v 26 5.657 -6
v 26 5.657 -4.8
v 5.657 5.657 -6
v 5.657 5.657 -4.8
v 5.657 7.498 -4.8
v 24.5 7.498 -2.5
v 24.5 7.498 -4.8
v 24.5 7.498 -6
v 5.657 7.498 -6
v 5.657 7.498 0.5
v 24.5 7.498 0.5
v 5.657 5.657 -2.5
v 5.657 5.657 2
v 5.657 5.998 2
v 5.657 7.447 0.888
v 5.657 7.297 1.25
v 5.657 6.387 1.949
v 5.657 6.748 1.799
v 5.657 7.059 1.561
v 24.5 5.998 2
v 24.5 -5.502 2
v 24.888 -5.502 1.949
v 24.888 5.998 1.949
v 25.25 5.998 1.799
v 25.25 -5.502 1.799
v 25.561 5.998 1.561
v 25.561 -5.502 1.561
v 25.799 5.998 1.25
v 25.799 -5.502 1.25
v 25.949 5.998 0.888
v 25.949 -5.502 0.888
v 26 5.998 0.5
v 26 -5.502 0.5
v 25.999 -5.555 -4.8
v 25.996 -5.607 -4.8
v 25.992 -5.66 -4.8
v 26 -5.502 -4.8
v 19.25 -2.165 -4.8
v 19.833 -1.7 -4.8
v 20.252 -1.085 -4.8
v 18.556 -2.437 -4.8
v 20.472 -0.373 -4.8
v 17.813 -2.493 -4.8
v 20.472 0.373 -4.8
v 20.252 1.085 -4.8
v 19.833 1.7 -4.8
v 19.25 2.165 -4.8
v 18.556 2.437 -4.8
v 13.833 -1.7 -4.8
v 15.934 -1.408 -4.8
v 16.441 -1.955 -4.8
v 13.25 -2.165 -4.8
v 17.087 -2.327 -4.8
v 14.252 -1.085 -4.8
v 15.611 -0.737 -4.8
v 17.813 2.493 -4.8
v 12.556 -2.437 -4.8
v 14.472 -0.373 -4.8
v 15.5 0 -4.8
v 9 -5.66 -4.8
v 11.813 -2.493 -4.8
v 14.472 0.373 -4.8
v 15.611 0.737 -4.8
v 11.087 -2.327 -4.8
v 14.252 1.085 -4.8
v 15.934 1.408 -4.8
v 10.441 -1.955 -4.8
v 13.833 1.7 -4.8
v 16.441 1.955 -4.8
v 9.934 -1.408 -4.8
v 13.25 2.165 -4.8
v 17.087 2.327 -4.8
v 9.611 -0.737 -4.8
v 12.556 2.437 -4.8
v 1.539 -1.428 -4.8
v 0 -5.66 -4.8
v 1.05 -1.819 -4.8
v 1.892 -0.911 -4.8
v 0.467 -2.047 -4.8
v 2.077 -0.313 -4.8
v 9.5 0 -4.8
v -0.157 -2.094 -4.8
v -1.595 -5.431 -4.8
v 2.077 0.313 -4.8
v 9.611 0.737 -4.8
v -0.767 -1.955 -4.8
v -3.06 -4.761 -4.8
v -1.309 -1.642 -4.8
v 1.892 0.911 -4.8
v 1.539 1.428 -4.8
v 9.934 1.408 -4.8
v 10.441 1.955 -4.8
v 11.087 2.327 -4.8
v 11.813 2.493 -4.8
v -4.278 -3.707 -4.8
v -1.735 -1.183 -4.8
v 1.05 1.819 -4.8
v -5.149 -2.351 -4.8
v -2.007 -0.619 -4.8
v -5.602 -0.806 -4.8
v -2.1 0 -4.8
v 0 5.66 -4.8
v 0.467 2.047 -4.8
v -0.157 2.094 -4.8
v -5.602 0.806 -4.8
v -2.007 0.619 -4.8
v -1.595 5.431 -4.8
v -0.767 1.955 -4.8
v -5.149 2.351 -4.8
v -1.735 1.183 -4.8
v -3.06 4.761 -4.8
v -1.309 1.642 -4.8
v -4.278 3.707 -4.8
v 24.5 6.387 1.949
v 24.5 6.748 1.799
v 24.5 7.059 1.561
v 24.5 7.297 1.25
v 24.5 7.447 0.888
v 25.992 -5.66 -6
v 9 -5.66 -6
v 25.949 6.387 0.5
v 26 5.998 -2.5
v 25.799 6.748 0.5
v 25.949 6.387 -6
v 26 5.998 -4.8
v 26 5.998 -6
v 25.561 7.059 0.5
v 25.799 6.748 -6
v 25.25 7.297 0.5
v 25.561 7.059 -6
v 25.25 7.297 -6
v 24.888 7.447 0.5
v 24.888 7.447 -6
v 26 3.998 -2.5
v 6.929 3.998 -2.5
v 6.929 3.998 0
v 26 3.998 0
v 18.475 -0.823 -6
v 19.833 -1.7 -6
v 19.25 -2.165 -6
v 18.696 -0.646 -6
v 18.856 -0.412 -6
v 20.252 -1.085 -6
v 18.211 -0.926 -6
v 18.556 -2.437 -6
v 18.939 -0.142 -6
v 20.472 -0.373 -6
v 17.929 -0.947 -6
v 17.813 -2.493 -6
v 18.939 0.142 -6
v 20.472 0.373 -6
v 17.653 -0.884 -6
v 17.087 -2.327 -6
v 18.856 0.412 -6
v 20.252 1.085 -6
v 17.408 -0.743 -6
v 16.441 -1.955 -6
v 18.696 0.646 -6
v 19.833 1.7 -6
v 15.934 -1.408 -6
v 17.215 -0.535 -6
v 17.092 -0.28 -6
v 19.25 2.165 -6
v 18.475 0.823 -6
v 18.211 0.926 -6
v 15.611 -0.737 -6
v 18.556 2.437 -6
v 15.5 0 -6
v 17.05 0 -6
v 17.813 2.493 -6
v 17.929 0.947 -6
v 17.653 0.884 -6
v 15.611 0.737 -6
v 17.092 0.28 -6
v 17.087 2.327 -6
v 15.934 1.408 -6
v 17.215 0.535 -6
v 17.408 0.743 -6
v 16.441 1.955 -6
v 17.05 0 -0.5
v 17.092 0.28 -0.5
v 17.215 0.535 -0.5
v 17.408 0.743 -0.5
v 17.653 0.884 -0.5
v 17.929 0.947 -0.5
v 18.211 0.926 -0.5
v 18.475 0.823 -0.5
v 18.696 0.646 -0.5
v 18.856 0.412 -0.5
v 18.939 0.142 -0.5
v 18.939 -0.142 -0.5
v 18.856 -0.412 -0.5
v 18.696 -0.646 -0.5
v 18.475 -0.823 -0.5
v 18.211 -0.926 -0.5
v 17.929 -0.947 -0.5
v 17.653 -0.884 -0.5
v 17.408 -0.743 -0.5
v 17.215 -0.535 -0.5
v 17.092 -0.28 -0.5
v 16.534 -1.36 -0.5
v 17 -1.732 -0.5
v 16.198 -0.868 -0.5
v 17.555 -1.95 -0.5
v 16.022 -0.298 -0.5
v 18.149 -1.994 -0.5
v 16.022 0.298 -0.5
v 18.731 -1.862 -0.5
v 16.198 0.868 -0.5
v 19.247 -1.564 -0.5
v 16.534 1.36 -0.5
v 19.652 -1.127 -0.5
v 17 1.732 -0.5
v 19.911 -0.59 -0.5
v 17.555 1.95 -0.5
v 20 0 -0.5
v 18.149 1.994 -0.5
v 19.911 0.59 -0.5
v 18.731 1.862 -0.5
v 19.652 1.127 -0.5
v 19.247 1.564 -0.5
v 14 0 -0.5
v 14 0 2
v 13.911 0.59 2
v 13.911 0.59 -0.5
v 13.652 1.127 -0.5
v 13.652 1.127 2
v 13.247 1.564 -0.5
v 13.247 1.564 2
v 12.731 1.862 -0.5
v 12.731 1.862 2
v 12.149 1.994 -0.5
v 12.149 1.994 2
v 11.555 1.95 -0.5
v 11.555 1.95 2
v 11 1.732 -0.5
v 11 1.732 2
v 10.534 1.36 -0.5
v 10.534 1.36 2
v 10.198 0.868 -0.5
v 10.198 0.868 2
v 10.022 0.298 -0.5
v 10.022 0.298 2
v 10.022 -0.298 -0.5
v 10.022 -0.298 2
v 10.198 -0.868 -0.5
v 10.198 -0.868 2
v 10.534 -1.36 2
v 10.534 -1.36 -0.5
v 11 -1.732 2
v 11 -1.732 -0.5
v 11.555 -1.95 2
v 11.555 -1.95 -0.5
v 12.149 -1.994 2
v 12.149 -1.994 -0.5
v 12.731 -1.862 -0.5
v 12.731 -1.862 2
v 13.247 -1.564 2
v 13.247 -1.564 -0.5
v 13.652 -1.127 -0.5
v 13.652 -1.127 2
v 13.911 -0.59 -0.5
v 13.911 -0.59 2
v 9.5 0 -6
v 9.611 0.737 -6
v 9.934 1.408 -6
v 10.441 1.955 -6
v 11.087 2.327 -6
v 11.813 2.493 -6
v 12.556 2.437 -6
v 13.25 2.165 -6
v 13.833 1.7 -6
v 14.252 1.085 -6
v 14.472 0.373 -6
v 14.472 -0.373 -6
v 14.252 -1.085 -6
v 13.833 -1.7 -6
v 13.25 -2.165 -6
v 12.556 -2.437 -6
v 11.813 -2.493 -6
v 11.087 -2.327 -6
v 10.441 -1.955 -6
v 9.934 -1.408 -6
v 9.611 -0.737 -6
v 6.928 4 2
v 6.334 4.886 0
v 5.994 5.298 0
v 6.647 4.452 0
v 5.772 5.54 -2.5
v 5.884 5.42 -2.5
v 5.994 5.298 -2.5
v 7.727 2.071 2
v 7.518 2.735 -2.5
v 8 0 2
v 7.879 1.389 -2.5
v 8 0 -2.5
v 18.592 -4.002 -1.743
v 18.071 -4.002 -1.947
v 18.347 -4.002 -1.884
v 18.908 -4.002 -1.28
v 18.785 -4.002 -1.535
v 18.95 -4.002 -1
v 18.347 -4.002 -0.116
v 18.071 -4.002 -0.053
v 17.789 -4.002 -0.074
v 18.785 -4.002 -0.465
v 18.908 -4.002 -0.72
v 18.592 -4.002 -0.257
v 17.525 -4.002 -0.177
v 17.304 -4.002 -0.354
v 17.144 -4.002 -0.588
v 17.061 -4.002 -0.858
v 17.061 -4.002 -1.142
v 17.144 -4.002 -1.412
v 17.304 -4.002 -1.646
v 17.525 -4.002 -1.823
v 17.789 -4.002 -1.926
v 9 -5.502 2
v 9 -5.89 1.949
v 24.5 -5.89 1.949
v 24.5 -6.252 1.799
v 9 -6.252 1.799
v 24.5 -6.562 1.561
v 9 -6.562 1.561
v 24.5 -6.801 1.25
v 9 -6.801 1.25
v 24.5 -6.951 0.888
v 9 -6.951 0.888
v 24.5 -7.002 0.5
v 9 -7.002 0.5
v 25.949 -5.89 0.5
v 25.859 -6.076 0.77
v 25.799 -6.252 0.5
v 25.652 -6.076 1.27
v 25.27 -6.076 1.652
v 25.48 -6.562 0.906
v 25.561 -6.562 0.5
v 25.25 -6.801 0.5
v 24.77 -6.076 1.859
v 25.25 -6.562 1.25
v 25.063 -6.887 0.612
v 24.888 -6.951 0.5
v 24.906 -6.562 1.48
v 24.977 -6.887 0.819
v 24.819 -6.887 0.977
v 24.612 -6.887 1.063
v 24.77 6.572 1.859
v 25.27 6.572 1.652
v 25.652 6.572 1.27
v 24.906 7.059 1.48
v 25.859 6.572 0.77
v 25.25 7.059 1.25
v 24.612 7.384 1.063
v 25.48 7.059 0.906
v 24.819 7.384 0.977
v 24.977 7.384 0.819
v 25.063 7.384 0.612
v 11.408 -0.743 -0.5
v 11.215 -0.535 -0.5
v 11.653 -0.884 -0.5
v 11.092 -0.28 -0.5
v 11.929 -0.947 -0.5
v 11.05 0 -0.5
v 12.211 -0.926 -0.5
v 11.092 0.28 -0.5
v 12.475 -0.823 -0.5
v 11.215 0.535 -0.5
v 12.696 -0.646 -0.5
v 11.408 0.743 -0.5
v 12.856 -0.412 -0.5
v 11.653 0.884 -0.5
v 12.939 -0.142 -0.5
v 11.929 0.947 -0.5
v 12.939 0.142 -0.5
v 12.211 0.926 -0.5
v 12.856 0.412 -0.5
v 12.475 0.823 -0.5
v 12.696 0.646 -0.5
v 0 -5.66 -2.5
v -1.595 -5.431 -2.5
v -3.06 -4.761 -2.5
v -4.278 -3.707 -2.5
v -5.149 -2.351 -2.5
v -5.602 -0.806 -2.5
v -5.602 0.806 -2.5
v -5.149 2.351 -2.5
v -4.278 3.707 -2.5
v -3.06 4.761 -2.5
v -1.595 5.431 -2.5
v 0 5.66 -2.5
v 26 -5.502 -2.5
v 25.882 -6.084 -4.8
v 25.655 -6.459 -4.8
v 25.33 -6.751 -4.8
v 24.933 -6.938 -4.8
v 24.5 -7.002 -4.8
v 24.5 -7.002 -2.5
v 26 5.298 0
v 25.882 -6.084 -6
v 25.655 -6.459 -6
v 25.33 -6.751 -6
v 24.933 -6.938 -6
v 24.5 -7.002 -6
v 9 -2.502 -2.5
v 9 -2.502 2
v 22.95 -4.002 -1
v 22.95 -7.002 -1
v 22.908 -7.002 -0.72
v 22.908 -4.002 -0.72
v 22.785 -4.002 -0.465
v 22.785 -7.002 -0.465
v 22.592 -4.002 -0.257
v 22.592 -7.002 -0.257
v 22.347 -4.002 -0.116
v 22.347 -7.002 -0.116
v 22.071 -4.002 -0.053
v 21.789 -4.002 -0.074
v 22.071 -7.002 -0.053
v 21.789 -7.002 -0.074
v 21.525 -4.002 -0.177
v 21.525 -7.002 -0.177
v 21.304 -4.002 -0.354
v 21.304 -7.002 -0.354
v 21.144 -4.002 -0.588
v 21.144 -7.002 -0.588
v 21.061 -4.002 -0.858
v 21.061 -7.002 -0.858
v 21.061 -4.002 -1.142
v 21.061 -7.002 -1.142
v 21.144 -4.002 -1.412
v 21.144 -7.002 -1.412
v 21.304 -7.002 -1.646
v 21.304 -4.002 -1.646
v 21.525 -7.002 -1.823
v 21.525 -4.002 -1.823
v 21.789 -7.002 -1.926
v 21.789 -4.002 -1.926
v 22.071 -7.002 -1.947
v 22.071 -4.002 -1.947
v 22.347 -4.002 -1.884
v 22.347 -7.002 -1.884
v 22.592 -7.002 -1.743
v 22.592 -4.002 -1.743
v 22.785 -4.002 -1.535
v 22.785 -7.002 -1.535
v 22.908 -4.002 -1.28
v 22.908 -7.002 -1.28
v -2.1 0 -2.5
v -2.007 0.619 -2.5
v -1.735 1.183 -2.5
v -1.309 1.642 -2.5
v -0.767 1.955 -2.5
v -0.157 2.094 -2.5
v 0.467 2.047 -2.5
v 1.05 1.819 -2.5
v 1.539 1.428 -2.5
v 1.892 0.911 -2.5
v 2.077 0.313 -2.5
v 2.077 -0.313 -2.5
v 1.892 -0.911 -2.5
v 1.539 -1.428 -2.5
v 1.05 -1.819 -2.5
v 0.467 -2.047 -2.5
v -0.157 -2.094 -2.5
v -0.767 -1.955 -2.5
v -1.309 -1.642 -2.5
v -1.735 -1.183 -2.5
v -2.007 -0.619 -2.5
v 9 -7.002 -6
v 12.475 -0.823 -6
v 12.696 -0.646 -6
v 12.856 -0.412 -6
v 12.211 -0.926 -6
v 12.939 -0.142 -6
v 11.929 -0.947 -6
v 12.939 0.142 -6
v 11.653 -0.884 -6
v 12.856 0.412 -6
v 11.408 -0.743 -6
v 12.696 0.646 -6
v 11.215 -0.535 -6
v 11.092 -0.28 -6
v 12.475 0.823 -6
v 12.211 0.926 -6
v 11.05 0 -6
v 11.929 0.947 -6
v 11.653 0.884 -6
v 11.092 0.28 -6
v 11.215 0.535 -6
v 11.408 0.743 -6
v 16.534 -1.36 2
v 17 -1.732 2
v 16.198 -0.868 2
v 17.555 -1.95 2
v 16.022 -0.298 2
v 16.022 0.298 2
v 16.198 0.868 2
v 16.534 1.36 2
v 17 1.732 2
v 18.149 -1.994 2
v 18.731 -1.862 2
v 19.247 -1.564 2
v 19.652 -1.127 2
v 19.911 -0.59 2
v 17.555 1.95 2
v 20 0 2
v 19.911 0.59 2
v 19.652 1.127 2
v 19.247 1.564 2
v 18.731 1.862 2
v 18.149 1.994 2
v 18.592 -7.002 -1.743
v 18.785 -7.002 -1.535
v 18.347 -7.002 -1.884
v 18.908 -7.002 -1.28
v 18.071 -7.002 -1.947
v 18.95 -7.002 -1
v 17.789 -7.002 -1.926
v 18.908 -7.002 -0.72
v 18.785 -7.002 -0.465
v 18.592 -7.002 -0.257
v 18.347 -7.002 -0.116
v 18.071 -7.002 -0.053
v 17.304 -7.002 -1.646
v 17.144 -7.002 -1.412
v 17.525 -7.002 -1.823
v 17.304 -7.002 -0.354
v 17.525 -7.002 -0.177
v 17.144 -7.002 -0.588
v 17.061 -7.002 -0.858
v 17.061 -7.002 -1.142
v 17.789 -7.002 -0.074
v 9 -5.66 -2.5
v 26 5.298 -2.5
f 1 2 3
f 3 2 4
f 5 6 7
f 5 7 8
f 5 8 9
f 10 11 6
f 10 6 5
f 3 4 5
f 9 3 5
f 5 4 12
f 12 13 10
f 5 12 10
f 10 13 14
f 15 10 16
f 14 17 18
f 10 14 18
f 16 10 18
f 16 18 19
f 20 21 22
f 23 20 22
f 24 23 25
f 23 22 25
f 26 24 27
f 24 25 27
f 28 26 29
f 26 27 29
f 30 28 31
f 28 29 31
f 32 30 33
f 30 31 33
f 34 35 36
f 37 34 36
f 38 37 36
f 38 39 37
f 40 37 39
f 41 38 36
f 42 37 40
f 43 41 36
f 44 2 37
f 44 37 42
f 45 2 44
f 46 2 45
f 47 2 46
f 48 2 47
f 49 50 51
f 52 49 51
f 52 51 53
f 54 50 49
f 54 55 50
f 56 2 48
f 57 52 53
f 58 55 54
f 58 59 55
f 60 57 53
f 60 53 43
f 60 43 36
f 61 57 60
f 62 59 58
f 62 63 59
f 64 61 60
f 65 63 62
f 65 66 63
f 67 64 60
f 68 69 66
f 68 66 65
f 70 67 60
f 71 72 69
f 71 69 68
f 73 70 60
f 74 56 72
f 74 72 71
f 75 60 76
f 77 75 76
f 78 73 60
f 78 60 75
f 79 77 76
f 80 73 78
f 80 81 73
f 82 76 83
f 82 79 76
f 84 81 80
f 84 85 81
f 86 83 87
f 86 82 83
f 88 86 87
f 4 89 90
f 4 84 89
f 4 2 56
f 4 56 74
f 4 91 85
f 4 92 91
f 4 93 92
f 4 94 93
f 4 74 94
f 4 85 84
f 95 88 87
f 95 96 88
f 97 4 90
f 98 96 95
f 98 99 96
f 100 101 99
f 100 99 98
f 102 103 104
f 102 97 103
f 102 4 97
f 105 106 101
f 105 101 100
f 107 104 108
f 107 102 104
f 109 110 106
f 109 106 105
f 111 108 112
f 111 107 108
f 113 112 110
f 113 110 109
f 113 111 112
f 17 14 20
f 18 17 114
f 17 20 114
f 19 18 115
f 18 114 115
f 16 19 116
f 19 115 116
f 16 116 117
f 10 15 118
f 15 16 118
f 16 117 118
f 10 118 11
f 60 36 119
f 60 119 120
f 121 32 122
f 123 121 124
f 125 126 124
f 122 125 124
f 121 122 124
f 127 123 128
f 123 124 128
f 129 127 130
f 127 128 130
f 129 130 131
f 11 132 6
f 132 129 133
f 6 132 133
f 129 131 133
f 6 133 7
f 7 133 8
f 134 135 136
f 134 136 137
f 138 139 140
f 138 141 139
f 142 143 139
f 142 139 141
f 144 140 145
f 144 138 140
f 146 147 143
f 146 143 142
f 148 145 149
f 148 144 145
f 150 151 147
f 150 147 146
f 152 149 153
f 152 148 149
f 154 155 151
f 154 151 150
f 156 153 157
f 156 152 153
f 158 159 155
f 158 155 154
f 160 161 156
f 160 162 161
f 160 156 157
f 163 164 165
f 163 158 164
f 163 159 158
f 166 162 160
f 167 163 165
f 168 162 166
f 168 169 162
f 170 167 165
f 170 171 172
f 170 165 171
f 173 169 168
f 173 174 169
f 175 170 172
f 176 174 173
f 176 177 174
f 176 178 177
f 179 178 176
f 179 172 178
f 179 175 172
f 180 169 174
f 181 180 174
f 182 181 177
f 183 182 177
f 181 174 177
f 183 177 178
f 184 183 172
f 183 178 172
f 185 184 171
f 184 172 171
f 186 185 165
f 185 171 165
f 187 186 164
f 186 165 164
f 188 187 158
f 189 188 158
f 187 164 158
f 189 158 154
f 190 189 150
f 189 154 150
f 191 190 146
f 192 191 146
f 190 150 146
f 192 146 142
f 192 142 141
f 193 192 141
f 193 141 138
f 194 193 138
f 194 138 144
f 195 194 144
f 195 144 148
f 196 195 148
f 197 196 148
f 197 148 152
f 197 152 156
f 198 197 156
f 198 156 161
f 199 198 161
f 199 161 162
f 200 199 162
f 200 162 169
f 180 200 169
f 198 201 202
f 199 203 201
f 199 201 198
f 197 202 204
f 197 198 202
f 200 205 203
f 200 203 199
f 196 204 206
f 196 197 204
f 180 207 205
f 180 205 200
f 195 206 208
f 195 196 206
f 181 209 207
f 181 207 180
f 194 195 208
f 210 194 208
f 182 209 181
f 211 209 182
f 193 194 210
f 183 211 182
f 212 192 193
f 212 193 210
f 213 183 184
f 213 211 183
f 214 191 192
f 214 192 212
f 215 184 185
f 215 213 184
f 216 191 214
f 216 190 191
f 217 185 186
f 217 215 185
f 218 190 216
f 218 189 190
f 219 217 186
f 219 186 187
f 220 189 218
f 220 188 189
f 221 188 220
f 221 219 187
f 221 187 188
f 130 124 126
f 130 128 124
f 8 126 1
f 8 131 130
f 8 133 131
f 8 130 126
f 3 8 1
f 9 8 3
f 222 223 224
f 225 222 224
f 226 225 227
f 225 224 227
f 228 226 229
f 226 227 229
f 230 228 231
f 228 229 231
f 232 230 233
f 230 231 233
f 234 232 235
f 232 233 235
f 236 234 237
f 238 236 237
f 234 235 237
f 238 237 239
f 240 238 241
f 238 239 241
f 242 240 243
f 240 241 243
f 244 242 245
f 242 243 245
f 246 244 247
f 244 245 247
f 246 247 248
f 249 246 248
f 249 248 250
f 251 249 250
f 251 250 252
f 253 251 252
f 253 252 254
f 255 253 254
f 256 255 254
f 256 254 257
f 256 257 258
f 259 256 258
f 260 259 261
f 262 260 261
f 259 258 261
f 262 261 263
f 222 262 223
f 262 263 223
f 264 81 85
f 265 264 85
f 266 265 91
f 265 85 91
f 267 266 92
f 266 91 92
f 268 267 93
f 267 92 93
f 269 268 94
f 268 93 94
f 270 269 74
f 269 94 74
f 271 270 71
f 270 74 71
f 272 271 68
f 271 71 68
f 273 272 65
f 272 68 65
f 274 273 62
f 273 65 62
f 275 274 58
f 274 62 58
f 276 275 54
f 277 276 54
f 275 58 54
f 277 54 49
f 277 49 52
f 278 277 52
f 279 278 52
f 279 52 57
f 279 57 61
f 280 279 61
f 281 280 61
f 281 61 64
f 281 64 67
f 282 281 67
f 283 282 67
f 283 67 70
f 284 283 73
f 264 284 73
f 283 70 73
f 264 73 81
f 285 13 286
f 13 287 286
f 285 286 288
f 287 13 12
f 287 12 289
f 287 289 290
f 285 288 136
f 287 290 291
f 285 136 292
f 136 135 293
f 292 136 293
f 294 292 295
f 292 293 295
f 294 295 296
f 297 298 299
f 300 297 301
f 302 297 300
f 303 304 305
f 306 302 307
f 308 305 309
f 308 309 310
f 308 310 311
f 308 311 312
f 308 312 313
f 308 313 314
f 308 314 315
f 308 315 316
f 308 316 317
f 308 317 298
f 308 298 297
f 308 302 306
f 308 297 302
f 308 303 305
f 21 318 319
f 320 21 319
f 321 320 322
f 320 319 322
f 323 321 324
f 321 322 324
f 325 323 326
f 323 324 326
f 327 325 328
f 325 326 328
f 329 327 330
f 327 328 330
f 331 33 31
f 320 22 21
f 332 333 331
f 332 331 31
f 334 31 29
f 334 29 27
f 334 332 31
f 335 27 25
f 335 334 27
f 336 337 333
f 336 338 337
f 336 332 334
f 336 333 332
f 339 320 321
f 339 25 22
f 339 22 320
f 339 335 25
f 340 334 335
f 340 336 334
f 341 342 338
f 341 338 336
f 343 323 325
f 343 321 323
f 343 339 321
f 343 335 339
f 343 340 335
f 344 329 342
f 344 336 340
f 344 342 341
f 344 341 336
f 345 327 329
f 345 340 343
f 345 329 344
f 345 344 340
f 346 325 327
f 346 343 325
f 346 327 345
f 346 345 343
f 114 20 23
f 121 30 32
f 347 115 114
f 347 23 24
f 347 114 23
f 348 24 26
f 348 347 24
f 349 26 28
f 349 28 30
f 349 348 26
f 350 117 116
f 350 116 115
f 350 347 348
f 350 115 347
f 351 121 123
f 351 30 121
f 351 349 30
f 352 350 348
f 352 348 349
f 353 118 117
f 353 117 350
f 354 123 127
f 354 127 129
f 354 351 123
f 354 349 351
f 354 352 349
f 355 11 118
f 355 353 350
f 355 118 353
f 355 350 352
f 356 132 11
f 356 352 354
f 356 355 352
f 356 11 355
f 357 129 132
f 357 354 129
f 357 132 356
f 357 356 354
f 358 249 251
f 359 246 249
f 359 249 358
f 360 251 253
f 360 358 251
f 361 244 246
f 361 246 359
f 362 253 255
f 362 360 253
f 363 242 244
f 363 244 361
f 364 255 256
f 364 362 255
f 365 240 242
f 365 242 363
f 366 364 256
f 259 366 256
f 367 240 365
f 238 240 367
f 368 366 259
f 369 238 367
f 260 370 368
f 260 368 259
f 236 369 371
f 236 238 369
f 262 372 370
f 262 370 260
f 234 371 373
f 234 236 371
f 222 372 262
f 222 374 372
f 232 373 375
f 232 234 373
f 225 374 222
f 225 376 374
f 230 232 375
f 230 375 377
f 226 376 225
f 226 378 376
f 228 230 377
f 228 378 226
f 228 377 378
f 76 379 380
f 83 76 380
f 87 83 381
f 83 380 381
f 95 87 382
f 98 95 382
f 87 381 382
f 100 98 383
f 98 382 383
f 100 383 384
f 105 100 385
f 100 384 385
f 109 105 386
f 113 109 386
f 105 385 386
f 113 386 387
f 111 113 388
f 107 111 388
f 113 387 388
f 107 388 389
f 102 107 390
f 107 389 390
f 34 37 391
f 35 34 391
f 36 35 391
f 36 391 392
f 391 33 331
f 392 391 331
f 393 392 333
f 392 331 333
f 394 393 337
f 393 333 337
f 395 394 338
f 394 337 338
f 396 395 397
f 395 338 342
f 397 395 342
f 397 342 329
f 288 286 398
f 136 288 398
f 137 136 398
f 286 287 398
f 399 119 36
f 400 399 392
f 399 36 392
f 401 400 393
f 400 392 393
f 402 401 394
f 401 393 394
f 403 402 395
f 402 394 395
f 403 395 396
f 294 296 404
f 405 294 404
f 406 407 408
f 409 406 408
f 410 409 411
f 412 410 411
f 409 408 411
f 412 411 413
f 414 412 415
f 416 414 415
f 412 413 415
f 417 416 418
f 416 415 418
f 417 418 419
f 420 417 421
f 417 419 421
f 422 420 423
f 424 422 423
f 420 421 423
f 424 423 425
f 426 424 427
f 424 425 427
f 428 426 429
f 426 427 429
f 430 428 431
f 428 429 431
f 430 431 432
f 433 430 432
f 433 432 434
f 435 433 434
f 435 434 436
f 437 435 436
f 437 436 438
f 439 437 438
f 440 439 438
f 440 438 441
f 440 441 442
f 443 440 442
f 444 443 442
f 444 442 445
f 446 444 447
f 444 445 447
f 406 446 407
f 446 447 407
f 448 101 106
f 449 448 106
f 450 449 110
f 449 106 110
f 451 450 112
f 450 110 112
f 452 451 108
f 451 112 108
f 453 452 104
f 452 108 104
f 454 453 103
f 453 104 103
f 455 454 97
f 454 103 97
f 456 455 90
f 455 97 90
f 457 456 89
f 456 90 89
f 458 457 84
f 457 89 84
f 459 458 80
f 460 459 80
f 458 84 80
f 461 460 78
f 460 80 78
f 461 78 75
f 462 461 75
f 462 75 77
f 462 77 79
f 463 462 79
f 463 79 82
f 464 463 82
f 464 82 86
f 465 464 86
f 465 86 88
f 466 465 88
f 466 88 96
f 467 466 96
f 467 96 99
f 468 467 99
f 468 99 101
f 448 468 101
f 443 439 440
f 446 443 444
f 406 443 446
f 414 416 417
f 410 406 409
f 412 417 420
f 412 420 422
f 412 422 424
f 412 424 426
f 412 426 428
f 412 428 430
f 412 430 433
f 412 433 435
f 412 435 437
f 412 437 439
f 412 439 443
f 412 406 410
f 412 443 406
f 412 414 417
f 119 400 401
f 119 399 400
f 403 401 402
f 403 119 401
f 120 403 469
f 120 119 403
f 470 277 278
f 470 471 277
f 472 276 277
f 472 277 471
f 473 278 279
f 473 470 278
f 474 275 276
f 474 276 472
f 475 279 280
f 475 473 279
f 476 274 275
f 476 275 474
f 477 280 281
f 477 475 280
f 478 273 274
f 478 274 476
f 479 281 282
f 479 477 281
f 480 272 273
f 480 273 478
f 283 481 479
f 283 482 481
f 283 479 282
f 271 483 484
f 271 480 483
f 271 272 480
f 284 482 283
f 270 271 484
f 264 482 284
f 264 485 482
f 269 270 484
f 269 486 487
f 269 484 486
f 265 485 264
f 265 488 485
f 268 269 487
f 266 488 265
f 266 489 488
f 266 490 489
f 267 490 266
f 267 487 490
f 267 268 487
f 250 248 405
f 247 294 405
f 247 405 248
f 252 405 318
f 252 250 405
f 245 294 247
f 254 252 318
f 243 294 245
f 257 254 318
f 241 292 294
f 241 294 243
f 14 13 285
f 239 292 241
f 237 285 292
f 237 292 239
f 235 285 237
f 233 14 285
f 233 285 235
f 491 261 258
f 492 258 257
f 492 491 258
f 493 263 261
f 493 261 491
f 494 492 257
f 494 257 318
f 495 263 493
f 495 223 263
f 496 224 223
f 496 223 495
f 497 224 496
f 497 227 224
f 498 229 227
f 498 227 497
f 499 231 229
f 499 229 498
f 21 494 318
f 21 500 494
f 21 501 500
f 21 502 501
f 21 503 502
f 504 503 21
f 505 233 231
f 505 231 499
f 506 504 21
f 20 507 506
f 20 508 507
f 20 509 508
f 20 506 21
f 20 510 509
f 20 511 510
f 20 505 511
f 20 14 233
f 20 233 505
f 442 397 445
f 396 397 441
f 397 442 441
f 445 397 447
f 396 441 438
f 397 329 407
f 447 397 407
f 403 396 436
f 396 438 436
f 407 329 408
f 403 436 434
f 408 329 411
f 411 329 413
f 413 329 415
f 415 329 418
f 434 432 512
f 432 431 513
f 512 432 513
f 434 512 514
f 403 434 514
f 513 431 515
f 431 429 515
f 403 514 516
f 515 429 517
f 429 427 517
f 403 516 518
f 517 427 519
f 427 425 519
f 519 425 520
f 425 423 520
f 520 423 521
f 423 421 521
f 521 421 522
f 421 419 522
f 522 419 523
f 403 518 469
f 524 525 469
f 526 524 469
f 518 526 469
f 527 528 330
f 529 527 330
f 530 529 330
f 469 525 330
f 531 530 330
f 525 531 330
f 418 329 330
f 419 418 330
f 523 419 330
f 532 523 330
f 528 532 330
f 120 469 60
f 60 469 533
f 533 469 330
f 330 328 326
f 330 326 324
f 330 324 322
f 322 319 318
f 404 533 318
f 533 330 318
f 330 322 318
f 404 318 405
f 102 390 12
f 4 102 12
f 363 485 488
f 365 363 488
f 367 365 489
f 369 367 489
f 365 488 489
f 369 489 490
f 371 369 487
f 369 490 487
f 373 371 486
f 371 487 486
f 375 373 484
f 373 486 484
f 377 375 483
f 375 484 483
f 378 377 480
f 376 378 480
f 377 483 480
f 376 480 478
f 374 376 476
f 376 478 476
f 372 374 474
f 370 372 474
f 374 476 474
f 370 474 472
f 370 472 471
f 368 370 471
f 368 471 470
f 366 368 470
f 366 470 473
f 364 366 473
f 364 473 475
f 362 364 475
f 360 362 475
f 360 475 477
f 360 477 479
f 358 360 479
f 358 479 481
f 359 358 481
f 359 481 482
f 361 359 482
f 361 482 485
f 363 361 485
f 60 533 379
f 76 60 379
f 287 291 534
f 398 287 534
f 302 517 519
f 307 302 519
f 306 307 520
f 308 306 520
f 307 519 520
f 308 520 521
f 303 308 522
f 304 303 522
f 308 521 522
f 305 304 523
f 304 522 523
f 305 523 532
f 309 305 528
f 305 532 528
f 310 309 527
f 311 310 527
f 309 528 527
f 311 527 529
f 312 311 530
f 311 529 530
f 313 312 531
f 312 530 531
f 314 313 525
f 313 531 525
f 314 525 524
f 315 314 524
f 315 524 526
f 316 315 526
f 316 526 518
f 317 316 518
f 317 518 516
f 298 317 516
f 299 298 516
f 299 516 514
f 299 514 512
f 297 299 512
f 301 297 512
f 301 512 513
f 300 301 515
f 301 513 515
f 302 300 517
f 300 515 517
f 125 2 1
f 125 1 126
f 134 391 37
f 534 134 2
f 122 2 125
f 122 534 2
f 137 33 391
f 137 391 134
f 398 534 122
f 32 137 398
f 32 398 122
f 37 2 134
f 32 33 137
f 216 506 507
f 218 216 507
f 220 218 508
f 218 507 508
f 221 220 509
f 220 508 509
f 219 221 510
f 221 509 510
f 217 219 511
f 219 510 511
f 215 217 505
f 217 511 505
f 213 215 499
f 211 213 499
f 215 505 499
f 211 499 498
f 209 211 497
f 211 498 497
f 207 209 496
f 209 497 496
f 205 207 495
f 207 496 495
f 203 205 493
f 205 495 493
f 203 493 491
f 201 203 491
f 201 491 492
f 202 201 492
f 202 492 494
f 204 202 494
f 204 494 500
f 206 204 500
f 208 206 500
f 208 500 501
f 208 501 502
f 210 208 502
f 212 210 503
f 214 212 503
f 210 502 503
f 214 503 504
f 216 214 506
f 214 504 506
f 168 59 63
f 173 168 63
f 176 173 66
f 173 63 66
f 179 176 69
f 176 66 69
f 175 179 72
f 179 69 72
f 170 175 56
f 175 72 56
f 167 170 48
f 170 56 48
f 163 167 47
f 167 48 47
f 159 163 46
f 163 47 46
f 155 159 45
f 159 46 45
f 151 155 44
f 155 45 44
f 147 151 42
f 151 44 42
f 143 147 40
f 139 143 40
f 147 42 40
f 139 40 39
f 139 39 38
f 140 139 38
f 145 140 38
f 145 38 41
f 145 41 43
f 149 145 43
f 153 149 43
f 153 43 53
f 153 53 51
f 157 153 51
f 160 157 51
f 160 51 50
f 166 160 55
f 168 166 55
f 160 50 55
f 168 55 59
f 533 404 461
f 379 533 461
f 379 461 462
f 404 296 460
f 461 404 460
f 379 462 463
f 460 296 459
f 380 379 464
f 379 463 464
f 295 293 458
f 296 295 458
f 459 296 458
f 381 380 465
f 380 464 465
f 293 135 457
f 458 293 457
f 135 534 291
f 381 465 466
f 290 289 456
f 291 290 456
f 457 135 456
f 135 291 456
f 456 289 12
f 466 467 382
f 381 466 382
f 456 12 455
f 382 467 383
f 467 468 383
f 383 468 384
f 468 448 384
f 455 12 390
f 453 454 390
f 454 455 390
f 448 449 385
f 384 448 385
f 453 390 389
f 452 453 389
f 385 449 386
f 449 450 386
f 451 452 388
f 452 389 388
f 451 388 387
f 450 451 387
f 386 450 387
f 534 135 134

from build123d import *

# Parameters (mm, degrees)
BOSS_EXTRUDE1_DEPTH = 2
BOSS_EXTRUDE2_START = 2.5
BOSS_EXTRUDE2_DEPTH = 2.5
CUT_EXTRUDE1_DEPTH  = 2.5
BOSS_EXTRUDE3_DEPTH = 2.3
SKETCH9_R           = 2.1
CUT_EXTRUDE2_DEPTH  = 2.5
SKETCH10_R          = 2.5
BOSS_EXTRUDE4_DEPTH = 1.2
SKETCH11_R          = 0.95
CUT_EXTRUDE3_DEPTH  = 9.2
SKETCH12_R          = 2
CUT_EXTRUDE4_DEPTH  = 2.5
SKETCH14_W          = 20.343145751
SKETCH14_H          = 1.841510486
SKETCH14_W_2        = 17
SKETCH14_H_2        = 1.34163614
BOSS_EXTRUDE5_DEPTH = 1.2
FILLET1_R           = 1.5
SKETCH17_R          = 0.95
CUT_EXTRUDE5_DEPTH  = 3


# Read off the part's stored shape, not the designer's step: Boss-Extrude3
with BuildPart() as part:
    # Sketch5 → Boss-Extrude1 (new body)
    with BuildSketch(Plane.XY):
        with BuildLine():
            Line((8, 0), (9, -2.501635265))
            Line((9, -2.501635265), (9, -7.001635265))
            Line((9, -7.001635265), (26, -7.001635265))
            Line((26, -7.001635265), (26, 7.498364735))
            Line((26, 7.498364735), (5.656854249, 7.498364735))
            Line((5.656854249, 7.498364735), (5.656854249, 5.656854249))
            ThreePointArc((5.656854249, 5.656854249), (7.39103626, 3.061467459), (8, 0))
        make_face()
    extrude(amount=BOSS_EXTRUDE1_DEPTH)

    # Sketch6 → Boss-Extrude2 (add)
    with BuildSketch(Plane(origin=(0, 0, 0), x_dir=(-1, 0, 0), z_dir=(0, 0, -1)).offset(BOSS_EXTRUDE2_START)):
        with BuildLine():
            Line((-5.656854249, 7.498364735), (-5.656854249, 5.656854249))
            ThreePointArc((-5.656854249, 5.656854249), (-7.39103626, 3.061467459), (-8, 0))
            Line((-8, 0), (-9, -2.501635265))
            Line((-9, -2.501635265), (-9, -7.001635265))
            Line((-9, -7.001635265), (-26, -7.001635265))
            Line((-26, -7.001635265), (-26, 7.498364735))
            Line((-26, 7.498364735), (-5.656854249, 7.498364735))
        make_face()
    extrude(amount=-BOSS_EXTRUDE2_DEPTH)

    # Sketch7 → Cut-Extrude1 (cut)
    with BuildSketch(Plane(origin=(0, 0, -2.5), x_dir=(-1, 0, 0), z_dir=(0, 0, -1))):
        Polygon((-26, 5.298364735), (-2.738141148, 5.298364735), (-2.738141148, 3.998364735), (-29.849535112, 3.998364735), (-29.849535112, 5.298364735), align=None)
    extrude(amount=-CUT_EXTRUDE1_DEPTH, mode=Mode.SUBTRACT)

    # Boss-Extrude3 outline → Boss-Extrude3 (add)
    with BuildSketch(Plane(origin=(0, 0, -2.5), x_dir=(-1, 0, 0), z_dir=(0, 0, -1))):
        with BuildLine():
            Line((-9, -7.001635265), (-9, -5.659999125))
            Line((-9, -5.659999125), (0, -5.659998688))
            ThreePointArc((0, -5.659998688), (5.659998688, 0), (0, 5.659998688))
            Line((0, 5.659998688), (-5.656854249, 5.656854249))
            Line((-5.656854249, 5.656854249), (-5.656854249, 7.498364735))
            Line((-5.656854249, 7.498364735), (-26, 7.498364735))
            Line((-26, 7.498364735), (-26, -7.001635265))
            Line((-26, -7.001635265), (-9, -7.001635265))
        make_face()
    extrude(amount=BOSS_EXTRUDE3_DEPTH)

    # Sketch9 → Cut-Extrude2 (cut)
    with BuildSketch(Plane(origin=(0, 0, -4.8), x_dir=(-1, 0, 0), z_dir=(0, 0, -1))):
        Circle(SKETCH9_R)
    extrude(amount=-CUT_EXTRUDE2_DEPTH, mode=Mode.SUBTRACT)

    # Sketch10 → Boss-Extrude4 (add)
    with BuildSketch(Plane(origin=(0, 0, -4.8), x_dir=(-1, 0, 0), z_dir=(0, 0, -1))):
        with Locations((-12, 0)):
            Circle(SKETCH10_R)
        with Locations((-18, 0)):
            Circle(SKETCH10_R)
    extrude(amount=BOSS_EXTRUDE4_DEPTH)

    # Sketch11 → Cut-Extrude3 (cut)
    with BuildSketch(Plane(origin=(0, 0, -6), x_dir=(-1, 0, 0), z_dir=(0, 0, -1))):
        with Locations((-18, 0)):
            Circle(SKETCH11_R)
        with Locations((-12, 0)):
            Circle(SKETCH11_R)
    extrude(amount=-CUT_EXTRUDE3_DEPTH, mode=Mode.SUBTRACT)

    # Sketch12 → Cut-Extrude4 (cut)
    with BuildSketch(Plane.XY.offset(2)):
        with Locations((12, 0)):
            Circle(SKETCH12_R)
        with Locations((18, 0)):
            Circle(SKETCH12_R)
    extrude(amount=-CUT_EXTRUDE4_DEPTH, mode=Mode.SUBTRACT)

    # Sketch14 → Boss-Extrude5 (add)
    with BuildSketch(Plane(origin=(0, 0, -4.8), x_dir=(-1, 0, 0), z_dir=(0, 0, -1))):
        with Locations((-15.828427124, 6.577609492)):
            Rectangle(SKETCH14_W, SKETCH14_H)
        with Locations((-17.5, -6.330817195)):
            Rectangle(SKETCH14_W_2, SKETCH14_H_2)
    extrude(amount=BOSS_EXTRUDE5_DEPTH)

    # Fillet1
    # the kernel refuses this fillet: 1.5 mm, written as the material it takes off along each edge
    with BuildSketch(Plane(origin=(24.5, -5.501635265, 0.5), x_dir=(0, 0, 1), z_dir=(0, -1, 0))) as fillet1_piece_1_section:
        Polygon((0, 0), (FILLET1_R, 0), (FILLET1_R, -FILLET1_R), (0, -FILLET1_R), align=None)
    fillet1_piece_1 = extrude(amount=FILLET1_R, mode=Mode.PRIVATE)
    fillet1_piece_1 = fillet1_piece_1 - Plane(origin=(24.5, -5.501635265, 0.5), x_dir=(-0.7071067811865475, 0, -0.7071067811865475), z_dir=(0, -1, 0)) * Sphere(FILLET1_R, mode=Mode.PRIVATE)
    add(fillet1_piece_1, mode=Mode.SUBTRACT)
    with BuildSketch(Plane(origin=(24.5, 5.998364735, 0.5), x_dir=(0, 0, 1), z_dir=(0, 1, 0))) as fillet1_piece_2_section:
        Polygon((0, 0), (FILLET1_R, 0), (FILLET1_R, FILLET1_R), (0, FILLET1_R), align=None)
    fillet1_piece_2 = extrude(amount=FILLET1_R, mode=Mode.PRIVATE)
    fillet1_piece_2 = fillet1_piece_2 - Plane(origin=(24.5, 5.998364735, 0.5), x_dir=(-0.7071067811865475, 0, -0.7071067811865475), z_dir=(0, 1, 0)) * Sphere(FILLET1_R, mode=Mode.PRIVATE)
    add(fillet1_piece_2, mode=Mode.SUBTRACT)
    with BuildSketch(Plane(origin=(26, -5.501635265, 2), x_dir=(-1, 0, 0), z_dir=(0, 1, 0))) as fillet1_piece_3:
        with BuildLine():
            CenterArc((FILLET1_R, -FILLET1_R), FILLET1_R, 90, 90)
            Line((0, -FILLET1_R), (0, 0))
            Line((0, 0), (FILLET1_R, 0))
        make_face()
    extrude(amount=11.5, mode=Mode.SUBTRACT)
    with BuildSketch(Plane(origin=(26, -7.001635265, -2.5), x_dir=(-1, 0, 0), z_dir=(0, 0, 1))) as fillet1_piece_4:
        with BuildLine():
            CenterArc((FILLET1_R, -FILLET1_R), FILLET1_R, 90, 90)
            Line((0, -FILLET1_R), (0, 0))
            Line((0, 0), (FILLET1_R, 0))
        make_face()
    extrude(amount=3, mode=Mode.SUBTRACT)
    with BuildSketch(Plane(origin=(5.25, -7.001635265, 2), x_dir=(0, 1, 0), z_dir=(1, 0, 0))) as fillet1_piece_5:
        with BuildLine():
            CenterArc((FILLET1_R, -FILLET1_R), FILLET1_R, 90, 90)
            Line((0, -FILLET1_R), (0, 0))
            Line((0, 0), (FILLET1_R, 0))
        make_face()
    extrude(amount=19.25, mode=Mode.SUBTRACT)
    with BuildSketch(Plane(origin=(24.5, 7.498364735, 2), x_dir=(0, -1, 0), z_dir=(-1, 0, 0))) as fillet1_piece_6:
        with BuildLine():
            CenterArc((FILLET1_R, -FILLET1_R), FILLET1_R, 90, 90)
            Line((0, -FILLET1_R), (0, 0))
            Line((0, 0), (FILLET1_R, 0))
        make_face()
    extrude(amount=22.593145751, mode=Mode.SUBTRACT)
    with BuildSketch(Plane(origin=(26, 7.498364735, -2.5), x_dir=(-1, 0, 0), z_dir=(0, 0, 1))) as fillet1_piece_7:
        with BuildLine():
            CenterArc((FILLET1_R, FILLET1_R), FILLET1_R, 180, 90)
            Line((0, FILLET1_R), (0, 0))
            Line((0, 0), (FILLET1_R, 0))
        make_face()
    extrude(amount=3, mode=Mode.SUBTRACT)
    with BuildSketch(Plane(origin=(26, 7.498364735, -2.5), x_dir=(-1.0, -1.9174232572065026e-10, 0), z_dir=(0, 0, -1))) as fillet1_piece_8:
        with BuildLine():
            CenterArc((FILLET1_R, -FILLET1_R), FILLET1_R, 90.000000011, 90)
            Line((FILLET1_R * 1.9173522033e-10, -FILLET1_R), (0, 0))
            Line((0, 0), (FILLET1_R, 0))
        make_face()
    extrude(amount=2.3, mode=Mode.SUBTRACT)
    with BuildSketch(Plane(origin=(26, 7.498364735, -4.8), x_dir=(-1, 0, 0), z_dir=(0, 0, -1))) as fillet1_piece_9:
        with BuildLine():
            CenterArc((FILLET1_R, -FILLET1_R), FILLET1_R, 90, 90)
            Line((0, -FILLET1_R), (0, 0))
            Line((0, 0), (FILLET1_R, 0))
        make_face()
    extrude(amount=4.95, mode=Mode.SUBTRACT)
    with BuildSketch(Plane(origin=(26, -7.001635265, -2.5), x_dir=(-1.0, -1.9169850891861218e-10, 0), z_dir=(0, 0, -1))) as fillet1_piece_10:
        with BuildLine():
            CenterArc((FILLET1_R, FILLET1_R), FILLET1_R, 180.000000011, 90)
            Line((-FILLET1_R * 1.91707982785e-10, FILLET1_R), (0, 0))
            Line((0, 0), (FILLET1_R, 0))
        make_face()
    extrude(amount=2.3, mode=Mode.SUBTRACT)
    with BuildSketch(Plane(origin=(26, -7.001635265, -4.8), x_dir=(-1, 0, 0), z_dir=(0, 0, -1))) as fillet1_piece_11:
        with BuildLine():
            CenterArc((FILLET1_R, FILLET1_R), FILLET1_R, 180, 90)
            Line((0, FILLET1_R), (0, 0))
            Line((0, 0), (FILLET1_R, 0))
        make_face()
    extrude(amount=4.95, mode=Mode.SUBTRACT)

    # Sketch17 → Cut-Extrude5 (cut)
    with BuildSketch(Plane.XZ.offset(7.001635265)):
        with Locations((22, -1)):
            Circle(SKETCH17_R)
        with Locations((18, -1)):
            Circle(SKETCH17_R)
    extrude(amount=-CUT_EXTRUDE5_DEPTH, mode=Mode.SUBTRACT)


solid = part.part
